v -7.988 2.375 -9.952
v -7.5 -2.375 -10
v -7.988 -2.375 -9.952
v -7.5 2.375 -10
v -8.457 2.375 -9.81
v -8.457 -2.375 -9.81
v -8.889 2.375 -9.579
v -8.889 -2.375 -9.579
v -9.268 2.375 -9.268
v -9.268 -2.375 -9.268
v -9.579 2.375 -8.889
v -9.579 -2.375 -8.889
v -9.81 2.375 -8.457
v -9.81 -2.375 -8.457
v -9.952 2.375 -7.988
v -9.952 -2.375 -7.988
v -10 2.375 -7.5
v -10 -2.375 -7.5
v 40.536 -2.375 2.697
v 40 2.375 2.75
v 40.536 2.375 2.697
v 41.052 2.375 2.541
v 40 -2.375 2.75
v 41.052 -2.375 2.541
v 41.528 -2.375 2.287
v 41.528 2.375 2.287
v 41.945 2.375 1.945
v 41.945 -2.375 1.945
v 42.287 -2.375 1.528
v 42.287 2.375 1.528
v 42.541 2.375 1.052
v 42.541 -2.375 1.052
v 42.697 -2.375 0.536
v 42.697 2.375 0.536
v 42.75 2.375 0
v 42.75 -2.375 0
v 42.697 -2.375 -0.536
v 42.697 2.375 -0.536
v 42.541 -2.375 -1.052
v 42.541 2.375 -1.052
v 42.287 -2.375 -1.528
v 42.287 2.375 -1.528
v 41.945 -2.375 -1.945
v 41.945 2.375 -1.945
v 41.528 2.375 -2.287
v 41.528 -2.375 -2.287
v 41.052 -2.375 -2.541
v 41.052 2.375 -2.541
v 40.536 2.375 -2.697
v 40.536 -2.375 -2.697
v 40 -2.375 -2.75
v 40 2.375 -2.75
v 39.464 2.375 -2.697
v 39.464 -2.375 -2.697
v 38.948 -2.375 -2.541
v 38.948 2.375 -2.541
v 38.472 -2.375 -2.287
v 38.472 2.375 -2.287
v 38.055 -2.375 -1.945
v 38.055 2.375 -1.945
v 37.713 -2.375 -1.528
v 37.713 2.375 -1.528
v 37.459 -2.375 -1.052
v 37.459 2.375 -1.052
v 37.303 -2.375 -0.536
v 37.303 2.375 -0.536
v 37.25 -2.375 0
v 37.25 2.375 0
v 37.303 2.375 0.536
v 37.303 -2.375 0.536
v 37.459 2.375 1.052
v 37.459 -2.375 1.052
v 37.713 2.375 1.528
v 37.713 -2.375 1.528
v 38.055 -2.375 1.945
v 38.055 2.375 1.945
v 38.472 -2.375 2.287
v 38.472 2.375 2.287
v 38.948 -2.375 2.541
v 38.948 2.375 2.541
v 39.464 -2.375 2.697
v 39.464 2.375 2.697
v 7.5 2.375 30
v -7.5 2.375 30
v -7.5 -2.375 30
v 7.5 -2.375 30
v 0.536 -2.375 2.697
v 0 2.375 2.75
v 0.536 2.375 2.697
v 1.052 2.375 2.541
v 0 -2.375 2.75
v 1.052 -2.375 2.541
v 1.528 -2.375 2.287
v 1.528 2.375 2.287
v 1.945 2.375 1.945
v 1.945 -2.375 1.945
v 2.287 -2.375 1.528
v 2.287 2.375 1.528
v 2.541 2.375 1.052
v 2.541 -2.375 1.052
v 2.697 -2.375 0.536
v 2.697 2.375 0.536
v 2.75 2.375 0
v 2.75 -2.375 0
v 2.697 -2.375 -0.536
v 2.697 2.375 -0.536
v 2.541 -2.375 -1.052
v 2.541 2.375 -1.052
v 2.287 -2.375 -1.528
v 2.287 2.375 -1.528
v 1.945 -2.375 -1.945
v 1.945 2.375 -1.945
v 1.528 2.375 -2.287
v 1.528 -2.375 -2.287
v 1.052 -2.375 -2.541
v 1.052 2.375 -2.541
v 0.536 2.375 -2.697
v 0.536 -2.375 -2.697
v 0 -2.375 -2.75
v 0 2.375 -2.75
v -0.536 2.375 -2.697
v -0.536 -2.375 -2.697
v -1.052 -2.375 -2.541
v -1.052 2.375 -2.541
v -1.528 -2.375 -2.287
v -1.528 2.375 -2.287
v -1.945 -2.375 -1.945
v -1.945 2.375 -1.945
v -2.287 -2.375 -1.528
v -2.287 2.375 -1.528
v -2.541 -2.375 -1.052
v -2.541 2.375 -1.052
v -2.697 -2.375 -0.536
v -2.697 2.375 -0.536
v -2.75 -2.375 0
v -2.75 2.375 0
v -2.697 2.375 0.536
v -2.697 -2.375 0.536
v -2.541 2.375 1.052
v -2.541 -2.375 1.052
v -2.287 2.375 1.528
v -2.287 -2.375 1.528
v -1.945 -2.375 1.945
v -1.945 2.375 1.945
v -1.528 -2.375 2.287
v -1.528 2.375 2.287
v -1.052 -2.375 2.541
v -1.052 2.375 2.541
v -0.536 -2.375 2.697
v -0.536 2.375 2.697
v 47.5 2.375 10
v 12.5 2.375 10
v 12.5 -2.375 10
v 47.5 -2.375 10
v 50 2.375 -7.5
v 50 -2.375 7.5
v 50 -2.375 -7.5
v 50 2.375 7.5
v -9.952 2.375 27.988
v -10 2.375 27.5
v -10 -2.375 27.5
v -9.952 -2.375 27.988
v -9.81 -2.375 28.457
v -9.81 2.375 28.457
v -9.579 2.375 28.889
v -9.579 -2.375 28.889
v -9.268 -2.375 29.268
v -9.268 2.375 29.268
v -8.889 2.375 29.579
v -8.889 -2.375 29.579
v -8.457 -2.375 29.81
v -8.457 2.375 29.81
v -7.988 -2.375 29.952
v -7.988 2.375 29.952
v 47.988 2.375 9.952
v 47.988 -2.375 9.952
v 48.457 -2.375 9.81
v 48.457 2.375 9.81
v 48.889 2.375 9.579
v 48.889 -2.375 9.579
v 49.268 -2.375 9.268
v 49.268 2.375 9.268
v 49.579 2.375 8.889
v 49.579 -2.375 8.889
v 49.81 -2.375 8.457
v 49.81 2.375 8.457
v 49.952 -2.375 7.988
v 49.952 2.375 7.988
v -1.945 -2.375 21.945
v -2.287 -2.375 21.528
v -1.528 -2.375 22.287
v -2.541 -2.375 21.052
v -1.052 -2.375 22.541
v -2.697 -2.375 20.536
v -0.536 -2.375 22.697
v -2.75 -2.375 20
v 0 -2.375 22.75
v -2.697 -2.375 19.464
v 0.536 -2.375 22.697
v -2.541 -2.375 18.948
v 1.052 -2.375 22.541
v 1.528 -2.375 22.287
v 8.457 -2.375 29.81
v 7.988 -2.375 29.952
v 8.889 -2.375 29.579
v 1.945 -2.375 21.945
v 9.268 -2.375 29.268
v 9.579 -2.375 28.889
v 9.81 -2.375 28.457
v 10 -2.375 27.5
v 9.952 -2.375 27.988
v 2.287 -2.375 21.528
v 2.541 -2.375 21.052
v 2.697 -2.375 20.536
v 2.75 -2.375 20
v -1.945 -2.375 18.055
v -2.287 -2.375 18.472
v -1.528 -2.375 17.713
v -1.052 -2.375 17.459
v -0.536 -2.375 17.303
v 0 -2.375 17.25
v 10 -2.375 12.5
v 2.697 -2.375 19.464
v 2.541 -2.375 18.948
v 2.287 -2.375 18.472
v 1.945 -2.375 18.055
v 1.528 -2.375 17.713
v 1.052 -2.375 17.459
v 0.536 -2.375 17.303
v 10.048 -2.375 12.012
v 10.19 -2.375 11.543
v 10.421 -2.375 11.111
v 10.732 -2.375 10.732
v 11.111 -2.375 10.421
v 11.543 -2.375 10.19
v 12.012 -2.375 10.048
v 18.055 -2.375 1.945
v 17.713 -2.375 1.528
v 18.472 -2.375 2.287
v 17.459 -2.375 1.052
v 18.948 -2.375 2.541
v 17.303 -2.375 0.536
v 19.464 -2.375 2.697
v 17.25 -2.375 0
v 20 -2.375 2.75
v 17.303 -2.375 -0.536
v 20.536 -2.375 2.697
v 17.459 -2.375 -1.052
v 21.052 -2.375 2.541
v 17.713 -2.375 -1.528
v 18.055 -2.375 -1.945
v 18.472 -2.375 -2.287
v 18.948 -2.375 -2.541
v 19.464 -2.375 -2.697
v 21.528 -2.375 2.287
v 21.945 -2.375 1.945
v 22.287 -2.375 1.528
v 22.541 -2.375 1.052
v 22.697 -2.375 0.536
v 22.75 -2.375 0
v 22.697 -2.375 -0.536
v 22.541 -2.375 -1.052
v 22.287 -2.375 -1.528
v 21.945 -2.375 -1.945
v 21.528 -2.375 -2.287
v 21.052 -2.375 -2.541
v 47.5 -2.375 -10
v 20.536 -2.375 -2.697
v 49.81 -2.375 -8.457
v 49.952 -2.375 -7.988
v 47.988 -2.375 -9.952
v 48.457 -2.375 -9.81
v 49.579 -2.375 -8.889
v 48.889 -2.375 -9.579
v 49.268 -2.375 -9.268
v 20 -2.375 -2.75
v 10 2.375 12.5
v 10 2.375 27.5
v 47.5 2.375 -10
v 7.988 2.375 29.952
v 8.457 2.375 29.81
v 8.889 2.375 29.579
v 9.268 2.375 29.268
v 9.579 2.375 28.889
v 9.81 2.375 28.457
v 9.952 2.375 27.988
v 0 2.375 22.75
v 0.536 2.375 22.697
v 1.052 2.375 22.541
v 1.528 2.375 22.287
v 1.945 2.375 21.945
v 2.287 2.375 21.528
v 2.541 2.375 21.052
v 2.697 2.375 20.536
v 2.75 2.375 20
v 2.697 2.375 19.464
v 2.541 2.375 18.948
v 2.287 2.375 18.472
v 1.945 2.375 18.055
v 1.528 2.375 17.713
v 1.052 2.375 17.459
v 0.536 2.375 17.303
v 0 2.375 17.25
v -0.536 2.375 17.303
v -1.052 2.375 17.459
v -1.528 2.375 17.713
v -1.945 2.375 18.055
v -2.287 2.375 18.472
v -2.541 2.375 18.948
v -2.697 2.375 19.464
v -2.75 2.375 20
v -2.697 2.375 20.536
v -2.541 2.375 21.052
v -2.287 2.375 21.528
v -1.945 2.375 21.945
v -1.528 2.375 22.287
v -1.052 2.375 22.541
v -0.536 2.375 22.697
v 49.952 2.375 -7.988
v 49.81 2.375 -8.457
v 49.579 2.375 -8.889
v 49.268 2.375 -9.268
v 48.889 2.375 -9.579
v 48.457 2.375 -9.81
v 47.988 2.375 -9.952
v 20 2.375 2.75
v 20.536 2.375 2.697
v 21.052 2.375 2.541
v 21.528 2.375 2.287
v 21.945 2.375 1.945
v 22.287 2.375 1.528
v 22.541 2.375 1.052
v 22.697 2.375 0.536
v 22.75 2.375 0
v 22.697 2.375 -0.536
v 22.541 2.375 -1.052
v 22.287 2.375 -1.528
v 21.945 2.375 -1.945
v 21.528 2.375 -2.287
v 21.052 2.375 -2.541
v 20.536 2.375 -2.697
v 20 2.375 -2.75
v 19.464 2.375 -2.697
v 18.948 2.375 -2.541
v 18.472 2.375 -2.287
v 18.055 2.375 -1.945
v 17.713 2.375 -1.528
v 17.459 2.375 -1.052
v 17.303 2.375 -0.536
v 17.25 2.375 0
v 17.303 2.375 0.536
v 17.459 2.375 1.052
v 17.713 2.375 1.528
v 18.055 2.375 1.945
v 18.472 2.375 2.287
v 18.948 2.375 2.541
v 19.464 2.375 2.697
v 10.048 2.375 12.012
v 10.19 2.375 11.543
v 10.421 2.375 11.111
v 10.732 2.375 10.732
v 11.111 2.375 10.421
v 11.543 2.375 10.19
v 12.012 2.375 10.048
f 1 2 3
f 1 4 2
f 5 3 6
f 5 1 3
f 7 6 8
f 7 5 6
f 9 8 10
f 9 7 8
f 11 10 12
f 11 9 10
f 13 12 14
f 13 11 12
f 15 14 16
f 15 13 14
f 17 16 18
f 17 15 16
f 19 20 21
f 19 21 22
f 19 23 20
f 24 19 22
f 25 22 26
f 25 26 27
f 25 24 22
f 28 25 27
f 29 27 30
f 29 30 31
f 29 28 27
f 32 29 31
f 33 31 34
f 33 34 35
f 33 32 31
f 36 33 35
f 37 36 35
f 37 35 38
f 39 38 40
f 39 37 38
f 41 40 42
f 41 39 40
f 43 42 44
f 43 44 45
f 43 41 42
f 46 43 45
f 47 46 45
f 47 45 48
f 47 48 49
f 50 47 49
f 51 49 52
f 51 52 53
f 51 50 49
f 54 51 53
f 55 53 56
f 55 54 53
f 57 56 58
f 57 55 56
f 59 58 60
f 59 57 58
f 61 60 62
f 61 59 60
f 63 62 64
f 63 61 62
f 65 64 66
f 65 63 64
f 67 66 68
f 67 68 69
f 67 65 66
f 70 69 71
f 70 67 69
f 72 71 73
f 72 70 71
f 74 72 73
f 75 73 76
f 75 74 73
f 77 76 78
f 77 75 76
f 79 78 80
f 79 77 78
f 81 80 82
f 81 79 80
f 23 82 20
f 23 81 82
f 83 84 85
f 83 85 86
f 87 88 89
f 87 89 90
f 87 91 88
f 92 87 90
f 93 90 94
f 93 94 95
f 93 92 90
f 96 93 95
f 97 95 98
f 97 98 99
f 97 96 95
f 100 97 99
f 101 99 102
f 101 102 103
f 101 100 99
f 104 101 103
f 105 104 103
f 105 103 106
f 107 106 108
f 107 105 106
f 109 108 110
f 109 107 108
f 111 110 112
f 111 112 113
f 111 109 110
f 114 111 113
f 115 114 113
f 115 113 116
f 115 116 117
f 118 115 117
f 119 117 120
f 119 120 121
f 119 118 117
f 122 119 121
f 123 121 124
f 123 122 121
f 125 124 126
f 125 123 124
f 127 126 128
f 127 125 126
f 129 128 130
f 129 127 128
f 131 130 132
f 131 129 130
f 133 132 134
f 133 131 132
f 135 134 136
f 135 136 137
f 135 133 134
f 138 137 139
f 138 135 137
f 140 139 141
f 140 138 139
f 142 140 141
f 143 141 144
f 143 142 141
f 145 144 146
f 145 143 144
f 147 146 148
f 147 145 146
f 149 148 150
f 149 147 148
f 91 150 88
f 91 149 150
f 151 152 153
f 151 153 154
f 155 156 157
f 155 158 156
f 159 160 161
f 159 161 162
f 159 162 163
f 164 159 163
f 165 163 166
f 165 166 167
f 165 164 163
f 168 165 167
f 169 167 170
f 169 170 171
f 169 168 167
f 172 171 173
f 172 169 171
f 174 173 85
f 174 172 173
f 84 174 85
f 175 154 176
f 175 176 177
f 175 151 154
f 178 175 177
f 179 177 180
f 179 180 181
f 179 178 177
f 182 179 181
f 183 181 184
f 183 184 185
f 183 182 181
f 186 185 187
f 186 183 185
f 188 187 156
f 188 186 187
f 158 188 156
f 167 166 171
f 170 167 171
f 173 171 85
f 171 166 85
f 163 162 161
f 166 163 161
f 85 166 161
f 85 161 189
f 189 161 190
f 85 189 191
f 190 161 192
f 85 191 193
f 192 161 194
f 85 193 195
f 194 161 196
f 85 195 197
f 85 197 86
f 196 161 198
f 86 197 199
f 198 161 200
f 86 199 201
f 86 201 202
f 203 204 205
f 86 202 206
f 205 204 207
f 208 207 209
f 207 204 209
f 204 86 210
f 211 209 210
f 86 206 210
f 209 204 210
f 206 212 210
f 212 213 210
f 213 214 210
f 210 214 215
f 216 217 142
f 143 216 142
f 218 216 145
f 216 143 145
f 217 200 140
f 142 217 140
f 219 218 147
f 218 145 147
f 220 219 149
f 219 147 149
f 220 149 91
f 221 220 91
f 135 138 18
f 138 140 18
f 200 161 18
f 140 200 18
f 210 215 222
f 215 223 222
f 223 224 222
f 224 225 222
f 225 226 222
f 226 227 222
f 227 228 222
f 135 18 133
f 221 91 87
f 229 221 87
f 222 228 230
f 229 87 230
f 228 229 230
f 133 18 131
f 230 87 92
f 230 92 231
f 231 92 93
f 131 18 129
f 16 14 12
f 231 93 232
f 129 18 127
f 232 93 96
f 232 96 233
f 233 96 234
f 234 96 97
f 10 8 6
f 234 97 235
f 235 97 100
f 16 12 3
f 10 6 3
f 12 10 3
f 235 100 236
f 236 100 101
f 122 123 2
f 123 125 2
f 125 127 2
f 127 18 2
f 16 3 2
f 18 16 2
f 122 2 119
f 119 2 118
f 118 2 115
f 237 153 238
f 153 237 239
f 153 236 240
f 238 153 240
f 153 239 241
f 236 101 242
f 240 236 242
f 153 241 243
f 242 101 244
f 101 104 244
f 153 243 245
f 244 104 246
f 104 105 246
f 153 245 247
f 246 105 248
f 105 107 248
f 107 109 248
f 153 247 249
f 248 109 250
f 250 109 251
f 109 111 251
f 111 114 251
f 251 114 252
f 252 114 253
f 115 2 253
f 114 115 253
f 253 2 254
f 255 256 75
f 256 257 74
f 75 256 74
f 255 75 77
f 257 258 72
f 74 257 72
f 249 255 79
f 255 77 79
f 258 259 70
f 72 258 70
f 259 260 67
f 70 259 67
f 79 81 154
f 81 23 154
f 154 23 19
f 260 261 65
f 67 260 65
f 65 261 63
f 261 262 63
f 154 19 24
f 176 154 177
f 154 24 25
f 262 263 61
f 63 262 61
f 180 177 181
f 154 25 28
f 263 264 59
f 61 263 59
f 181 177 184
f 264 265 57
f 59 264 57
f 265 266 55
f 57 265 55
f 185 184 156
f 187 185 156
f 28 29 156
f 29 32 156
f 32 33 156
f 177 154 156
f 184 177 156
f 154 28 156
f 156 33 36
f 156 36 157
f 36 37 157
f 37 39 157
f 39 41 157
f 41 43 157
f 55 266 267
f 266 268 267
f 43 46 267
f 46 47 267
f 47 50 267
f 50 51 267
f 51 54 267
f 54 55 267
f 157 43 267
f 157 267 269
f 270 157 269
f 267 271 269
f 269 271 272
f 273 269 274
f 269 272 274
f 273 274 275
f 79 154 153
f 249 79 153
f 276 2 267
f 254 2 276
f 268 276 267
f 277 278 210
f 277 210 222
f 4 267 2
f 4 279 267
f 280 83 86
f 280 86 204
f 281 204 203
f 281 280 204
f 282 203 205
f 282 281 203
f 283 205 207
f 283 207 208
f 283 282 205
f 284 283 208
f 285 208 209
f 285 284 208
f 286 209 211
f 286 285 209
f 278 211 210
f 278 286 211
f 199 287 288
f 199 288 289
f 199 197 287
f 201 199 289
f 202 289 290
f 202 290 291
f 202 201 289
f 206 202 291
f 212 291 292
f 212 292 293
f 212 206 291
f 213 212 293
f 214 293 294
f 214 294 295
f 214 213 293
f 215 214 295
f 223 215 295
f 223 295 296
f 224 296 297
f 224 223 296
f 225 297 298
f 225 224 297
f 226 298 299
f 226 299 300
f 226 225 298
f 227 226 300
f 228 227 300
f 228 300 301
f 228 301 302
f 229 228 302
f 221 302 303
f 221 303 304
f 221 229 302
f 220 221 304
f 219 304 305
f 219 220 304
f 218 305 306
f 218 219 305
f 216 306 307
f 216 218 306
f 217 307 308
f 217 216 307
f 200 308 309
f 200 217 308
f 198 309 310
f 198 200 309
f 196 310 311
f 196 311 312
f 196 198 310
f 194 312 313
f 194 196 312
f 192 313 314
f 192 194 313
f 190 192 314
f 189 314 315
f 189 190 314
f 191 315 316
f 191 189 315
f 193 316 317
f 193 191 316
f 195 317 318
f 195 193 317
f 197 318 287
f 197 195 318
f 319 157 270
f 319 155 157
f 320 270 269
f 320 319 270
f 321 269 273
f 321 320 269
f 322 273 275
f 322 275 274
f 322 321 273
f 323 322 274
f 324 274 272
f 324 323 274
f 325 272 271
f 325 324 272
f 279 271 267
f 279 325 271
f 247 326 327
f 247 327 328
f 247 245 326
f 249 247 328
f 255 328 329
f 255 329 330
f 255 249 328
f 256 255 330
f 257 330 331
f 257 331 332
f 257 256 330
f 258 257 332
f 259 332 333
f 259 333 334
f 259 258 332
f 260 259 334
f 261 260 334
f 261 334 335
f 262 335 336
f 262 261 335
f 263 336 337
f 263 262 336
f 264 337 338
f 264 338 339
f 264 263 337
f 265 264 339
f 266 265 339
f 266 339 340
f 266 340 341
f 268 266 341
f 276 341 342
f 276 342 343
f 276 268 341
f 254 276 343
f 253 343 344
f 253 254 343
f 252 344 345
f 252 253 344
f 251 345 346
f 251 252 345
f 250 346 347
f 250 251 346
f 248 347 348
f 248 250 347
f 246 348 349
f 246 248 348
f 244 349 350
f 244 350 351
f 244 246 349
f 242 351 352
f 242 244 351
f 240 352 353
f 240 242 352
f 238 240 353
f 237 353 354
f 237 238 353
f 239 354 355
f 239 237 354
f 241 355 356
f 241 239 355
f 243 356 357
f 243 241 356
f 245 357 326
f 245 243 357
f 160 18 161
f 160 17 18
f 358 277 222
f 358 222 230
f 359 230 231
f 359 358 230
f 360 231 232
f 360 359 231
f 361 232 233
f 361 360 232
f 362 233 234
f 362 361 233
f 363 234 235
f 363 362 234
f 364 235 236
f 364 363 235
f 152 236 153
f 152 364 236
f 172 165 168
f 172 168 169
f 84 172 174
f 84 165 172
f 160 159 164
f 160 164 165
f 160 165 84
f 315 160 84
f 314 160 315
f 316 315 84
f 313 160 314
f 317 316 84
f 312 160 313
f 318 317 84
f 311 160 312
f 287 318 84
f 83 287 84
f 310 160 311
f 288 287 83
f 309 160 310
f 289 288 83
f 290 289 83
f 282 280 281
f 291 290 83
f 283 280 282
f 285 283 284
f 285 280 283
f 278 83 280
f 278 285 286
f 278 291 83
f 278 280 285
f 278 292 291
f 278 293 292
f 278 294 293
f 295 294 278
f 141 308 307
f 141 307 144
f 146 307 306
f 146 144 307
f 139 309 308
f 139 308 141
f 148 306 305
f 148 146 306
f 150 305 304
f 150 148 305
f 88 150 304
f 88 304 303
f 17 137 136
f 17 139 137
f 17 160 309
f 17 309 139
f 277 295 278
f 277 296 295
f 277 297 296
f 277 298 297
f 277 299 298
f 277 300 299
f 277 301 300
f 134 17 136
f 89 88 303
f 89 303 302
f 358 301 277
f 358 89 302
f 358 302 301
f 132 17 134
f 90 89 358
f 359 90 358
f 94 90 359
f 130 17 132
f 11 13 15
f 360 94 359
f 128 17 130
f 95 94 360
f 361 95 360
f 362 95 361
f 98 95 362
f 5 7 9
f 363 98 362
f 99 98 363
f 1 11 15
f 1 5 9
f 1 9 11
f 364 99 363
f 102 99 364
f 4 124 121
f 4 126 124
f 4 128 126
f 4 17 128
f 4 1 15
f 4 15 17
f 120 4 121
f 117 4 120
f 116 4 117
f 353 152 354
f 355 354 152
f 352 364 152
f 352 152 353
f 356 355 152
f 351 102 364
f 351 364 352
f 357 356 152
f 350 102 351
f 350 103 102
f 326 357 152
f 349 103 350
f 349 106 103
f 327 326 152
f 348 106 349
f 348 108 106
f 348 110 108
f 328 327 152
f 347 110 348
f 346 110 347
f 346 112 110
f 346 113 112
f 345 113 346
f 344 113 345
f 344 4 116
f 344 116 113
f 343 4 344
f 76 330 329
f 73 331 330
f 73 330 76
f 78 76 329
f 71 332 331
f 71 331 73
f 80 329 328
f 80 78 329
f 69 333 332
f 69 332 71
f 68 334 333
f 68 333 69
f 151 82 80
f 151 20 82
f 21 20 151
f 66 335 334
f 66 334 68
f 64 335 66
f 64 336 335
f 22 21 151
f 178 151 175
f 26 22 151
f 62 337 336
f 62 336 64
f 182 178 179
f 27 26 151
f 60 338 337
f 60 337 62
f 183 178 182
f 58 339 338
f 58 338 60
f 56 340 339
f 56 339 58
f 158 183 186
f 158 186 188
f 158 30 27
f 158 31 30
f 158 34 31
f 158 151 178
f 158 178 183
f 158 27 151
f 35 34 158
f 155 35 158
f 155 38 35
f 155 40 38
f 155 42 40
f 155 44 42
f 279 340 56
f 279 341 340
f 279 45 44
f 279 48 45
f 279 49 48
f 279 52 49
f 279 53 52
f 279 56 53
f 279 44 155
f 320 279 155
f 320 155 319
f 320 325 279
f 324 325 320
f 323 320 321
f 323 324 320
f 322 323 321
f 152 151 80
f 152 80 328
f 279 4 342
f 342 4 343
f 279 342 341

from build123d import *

# Parameters (mm, degrees)
SKETCH1_R           = 2.75
BOSS_EXTRUDE1_DEPTH = 2.3749


with BuildPart() as part:
    # Sketch1 → Boss-Extrude1 (new, symmetric)
    with BuildSketch(Plane(origin=(0, 0, 0), x_dir=(1, 0, 0), z_dir=(0, 1, 0))):
        with BuildLine():
            Line((-10, 7.5), (-10, -27.5))
            ThreePointArc((-10, -27.5), (-9.267766953, -29.267766953), (-7.5, -30))
            Line((-7.5, -30), (7.5, -30))
            ThreePointArc((7.5, -30), (9.267766953, -29.267766953), (10, -27.5))
            Line((10, -27.5), (10, -12.5))
            ThreePointArc((10, -12.5), (10.732233047, -10.732233047), (12.5, -10))
            Line((12.5, -10), (47.5, -10))
            ThreePointArc((47.5, -10), (49.267766953, -9.267766953), (50, -7.5))
            Line((50, -7.5), (50, 7.5))
            ThreePointArc((50, 7.5), (49.267766953, 9.267766953), (47.5, 10))
            Line((47.5, 10), (-7.5, 10))
            ThreePointArc((-7.5, 10), (-9.267766953, 9.267766953), (-10, 7.5))
        make_face()
        with Locations(Location((0, 0, 0), (0, 0, 270))):
            Circle(SKETCH1_R, mode=Mode.SUBTRACT)
        with Locations(Location((20, 0, 0), (0, 0, 270))):
            Circle(SKETCH1_R, mode=Mode.SUBTRACT)
        with Locations(Location((40, 0, 0), (0, 0, 270))):
            Circle(SKETCH1_R, mode=Mode.SUBTRACT)
        with Locations(Location((0, -20, 0), (0, 0, 270))):
            Circle(SKETCH1_R, mode=Mode.SUBTRACT)
    extrude(amount=BOSS_EXTRUDE1_DEPTH, both=True)


solid = part.part
